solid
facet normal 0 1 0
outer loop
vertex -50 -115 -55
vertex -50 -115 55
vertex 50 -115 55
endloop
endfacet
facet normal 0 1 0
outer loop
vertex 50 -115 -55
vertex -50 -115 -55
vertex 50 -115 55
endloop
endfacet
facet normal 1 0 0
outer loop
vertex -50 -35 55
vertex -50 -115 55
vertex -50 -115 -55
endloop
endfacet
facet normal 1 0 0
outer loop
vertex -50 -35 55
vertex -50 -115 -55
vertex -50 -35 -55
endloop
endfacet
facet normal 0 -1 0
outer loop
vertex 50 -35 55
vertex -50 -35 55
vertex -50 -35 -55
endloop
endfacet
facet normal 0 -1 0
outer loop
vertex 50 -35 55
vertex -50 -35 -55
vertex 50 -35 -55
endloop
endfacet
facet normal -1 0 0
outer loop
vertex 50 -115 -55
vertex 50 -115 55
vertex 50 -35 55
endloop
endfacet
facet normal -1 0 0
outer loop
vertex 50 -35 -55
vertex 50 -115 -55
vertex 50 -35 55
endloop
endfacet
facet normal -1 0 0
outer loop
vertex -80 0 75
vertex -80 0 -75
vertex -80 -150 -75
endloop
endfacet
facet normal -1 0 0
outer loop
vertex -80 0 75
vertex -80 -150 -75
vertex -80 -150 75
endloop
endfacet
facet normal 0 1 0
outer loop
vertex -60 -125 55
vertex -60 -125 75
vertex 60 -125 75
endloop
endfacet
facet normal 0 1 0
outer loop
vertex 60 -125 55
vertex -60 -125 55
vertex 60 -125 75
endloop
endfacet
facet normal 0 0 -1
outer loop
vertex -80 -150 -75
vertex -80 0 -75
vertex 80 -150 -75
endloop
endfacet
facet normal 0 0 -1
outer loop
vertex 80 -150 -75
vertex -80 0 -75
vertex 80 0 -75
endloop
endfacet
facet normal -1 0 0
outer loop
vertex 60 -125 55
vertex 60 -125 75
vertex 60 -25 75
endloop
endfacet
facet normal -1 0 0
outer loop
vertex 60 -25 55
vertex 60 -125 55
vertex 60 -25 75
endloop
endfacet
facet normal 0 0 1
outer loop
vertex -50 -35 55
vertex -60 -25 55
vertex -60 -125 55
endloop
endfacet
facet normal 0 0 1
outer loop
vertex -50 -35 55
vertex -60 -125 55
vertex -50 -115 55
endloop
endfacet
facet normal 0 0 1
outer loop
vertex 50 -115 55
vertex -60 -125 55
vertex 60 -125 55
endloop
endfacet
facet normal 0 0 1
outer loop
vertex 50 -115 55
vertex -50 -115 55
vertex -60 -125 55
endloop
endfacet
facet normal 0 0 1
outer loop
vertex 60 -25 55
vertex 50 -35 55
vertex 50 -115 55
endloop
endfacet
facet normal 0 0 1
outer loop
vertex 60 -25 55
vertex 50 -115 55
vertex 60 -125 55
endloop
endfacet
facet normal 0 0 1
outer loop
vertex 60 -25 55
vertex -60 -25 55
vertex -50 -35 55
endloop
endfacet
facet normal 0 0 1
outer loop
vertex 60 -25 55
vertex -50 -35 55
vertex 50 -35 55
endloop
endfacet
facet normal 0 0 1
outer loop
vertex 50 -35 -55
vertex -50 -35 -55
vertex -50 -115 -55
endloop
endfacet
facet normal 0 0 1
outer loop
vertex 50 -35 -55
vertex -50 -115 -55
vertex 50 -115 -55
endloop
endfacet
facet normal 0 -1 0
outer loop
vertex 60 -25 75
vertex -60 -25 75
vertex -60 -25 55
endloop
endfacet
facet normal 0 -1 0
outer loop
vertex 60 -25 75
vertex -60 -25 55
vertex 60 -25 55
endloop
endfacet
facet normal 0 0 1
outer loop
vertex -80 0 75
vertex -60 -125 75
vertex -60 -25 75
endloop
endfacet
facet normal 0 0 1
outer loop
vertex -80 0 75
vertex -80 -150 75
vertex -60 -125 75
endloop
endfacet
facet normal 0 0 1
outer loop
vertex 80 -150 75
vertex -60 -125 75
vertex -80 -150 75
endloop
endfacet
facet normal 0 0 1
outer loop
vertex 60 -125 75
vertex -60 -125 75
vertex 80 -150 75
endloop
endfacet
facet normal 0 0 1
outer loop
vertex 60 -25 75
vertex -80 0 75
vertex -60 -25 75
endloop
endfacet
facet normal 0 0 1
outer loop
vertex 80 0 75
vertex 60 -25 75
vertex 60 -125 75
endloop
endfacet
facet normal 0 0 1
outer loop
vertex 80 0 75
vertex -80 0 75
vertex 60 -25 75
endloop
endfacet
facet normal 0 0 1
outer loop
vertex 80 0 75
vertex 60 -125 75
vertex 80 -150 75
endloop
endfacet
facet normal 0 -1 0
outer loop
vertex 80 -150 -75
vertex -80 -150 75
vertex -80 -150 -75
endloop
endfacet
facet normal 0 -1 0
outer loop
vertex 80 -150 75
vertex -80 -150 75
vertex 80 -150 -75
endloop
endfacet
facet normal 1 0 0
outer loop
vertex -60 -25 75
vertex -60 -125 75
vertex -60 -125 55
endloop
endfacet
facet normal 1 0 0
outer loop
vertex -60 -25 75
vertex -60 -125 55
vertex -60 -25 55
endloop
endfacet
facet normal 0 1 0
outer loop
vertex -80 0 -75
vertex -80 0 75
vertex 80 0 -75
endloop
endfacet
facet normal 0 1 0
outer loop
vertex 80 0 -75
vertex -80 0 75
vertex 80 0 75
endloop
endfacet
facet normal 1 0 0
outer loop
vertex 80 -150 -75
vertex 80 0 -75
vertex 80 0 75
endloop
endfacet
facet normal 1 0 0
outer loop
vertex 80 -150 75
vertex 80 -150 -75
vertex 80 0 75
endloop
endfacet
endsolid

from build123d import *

# Parameters (mm, degrees)
F0_W     = 160
F0_H     = 150
F1_DEPTH = 150
F2_W     = 120
F2_H     = 100
F3_DEPTH = 20
F4_W     = 100
F4_H     = 80
F5_DEPTH = 110


with BuildPart() as f1:
    # F0 (on Front) → F1 (new body)
    with BuildSketch(Plane.XZ):
        Rectangle(F0_W, F0_H)
    extrude(amount=F1_DEPTH)

    # F2 (on face) → F3 (cut)
    with BuildSketch(Plane.XY.offset(75)):
        with Locations((0, -75)):
            Rectangle(F2_W, F2_H)
    extrude(amount=-F3_DEPTH, mode=Mode.SUBTRACT)

    # F4 (on face) → F5 (cut)
    with BuildSketch(Plane.XY.offset(55)):
        with Locations((0, -75)):
            Rectangle(F4_W, F4_H)
    extrude(amount=-F5_DEPTH, mode=Mode.SUBTRACT)


solid = f1.part
